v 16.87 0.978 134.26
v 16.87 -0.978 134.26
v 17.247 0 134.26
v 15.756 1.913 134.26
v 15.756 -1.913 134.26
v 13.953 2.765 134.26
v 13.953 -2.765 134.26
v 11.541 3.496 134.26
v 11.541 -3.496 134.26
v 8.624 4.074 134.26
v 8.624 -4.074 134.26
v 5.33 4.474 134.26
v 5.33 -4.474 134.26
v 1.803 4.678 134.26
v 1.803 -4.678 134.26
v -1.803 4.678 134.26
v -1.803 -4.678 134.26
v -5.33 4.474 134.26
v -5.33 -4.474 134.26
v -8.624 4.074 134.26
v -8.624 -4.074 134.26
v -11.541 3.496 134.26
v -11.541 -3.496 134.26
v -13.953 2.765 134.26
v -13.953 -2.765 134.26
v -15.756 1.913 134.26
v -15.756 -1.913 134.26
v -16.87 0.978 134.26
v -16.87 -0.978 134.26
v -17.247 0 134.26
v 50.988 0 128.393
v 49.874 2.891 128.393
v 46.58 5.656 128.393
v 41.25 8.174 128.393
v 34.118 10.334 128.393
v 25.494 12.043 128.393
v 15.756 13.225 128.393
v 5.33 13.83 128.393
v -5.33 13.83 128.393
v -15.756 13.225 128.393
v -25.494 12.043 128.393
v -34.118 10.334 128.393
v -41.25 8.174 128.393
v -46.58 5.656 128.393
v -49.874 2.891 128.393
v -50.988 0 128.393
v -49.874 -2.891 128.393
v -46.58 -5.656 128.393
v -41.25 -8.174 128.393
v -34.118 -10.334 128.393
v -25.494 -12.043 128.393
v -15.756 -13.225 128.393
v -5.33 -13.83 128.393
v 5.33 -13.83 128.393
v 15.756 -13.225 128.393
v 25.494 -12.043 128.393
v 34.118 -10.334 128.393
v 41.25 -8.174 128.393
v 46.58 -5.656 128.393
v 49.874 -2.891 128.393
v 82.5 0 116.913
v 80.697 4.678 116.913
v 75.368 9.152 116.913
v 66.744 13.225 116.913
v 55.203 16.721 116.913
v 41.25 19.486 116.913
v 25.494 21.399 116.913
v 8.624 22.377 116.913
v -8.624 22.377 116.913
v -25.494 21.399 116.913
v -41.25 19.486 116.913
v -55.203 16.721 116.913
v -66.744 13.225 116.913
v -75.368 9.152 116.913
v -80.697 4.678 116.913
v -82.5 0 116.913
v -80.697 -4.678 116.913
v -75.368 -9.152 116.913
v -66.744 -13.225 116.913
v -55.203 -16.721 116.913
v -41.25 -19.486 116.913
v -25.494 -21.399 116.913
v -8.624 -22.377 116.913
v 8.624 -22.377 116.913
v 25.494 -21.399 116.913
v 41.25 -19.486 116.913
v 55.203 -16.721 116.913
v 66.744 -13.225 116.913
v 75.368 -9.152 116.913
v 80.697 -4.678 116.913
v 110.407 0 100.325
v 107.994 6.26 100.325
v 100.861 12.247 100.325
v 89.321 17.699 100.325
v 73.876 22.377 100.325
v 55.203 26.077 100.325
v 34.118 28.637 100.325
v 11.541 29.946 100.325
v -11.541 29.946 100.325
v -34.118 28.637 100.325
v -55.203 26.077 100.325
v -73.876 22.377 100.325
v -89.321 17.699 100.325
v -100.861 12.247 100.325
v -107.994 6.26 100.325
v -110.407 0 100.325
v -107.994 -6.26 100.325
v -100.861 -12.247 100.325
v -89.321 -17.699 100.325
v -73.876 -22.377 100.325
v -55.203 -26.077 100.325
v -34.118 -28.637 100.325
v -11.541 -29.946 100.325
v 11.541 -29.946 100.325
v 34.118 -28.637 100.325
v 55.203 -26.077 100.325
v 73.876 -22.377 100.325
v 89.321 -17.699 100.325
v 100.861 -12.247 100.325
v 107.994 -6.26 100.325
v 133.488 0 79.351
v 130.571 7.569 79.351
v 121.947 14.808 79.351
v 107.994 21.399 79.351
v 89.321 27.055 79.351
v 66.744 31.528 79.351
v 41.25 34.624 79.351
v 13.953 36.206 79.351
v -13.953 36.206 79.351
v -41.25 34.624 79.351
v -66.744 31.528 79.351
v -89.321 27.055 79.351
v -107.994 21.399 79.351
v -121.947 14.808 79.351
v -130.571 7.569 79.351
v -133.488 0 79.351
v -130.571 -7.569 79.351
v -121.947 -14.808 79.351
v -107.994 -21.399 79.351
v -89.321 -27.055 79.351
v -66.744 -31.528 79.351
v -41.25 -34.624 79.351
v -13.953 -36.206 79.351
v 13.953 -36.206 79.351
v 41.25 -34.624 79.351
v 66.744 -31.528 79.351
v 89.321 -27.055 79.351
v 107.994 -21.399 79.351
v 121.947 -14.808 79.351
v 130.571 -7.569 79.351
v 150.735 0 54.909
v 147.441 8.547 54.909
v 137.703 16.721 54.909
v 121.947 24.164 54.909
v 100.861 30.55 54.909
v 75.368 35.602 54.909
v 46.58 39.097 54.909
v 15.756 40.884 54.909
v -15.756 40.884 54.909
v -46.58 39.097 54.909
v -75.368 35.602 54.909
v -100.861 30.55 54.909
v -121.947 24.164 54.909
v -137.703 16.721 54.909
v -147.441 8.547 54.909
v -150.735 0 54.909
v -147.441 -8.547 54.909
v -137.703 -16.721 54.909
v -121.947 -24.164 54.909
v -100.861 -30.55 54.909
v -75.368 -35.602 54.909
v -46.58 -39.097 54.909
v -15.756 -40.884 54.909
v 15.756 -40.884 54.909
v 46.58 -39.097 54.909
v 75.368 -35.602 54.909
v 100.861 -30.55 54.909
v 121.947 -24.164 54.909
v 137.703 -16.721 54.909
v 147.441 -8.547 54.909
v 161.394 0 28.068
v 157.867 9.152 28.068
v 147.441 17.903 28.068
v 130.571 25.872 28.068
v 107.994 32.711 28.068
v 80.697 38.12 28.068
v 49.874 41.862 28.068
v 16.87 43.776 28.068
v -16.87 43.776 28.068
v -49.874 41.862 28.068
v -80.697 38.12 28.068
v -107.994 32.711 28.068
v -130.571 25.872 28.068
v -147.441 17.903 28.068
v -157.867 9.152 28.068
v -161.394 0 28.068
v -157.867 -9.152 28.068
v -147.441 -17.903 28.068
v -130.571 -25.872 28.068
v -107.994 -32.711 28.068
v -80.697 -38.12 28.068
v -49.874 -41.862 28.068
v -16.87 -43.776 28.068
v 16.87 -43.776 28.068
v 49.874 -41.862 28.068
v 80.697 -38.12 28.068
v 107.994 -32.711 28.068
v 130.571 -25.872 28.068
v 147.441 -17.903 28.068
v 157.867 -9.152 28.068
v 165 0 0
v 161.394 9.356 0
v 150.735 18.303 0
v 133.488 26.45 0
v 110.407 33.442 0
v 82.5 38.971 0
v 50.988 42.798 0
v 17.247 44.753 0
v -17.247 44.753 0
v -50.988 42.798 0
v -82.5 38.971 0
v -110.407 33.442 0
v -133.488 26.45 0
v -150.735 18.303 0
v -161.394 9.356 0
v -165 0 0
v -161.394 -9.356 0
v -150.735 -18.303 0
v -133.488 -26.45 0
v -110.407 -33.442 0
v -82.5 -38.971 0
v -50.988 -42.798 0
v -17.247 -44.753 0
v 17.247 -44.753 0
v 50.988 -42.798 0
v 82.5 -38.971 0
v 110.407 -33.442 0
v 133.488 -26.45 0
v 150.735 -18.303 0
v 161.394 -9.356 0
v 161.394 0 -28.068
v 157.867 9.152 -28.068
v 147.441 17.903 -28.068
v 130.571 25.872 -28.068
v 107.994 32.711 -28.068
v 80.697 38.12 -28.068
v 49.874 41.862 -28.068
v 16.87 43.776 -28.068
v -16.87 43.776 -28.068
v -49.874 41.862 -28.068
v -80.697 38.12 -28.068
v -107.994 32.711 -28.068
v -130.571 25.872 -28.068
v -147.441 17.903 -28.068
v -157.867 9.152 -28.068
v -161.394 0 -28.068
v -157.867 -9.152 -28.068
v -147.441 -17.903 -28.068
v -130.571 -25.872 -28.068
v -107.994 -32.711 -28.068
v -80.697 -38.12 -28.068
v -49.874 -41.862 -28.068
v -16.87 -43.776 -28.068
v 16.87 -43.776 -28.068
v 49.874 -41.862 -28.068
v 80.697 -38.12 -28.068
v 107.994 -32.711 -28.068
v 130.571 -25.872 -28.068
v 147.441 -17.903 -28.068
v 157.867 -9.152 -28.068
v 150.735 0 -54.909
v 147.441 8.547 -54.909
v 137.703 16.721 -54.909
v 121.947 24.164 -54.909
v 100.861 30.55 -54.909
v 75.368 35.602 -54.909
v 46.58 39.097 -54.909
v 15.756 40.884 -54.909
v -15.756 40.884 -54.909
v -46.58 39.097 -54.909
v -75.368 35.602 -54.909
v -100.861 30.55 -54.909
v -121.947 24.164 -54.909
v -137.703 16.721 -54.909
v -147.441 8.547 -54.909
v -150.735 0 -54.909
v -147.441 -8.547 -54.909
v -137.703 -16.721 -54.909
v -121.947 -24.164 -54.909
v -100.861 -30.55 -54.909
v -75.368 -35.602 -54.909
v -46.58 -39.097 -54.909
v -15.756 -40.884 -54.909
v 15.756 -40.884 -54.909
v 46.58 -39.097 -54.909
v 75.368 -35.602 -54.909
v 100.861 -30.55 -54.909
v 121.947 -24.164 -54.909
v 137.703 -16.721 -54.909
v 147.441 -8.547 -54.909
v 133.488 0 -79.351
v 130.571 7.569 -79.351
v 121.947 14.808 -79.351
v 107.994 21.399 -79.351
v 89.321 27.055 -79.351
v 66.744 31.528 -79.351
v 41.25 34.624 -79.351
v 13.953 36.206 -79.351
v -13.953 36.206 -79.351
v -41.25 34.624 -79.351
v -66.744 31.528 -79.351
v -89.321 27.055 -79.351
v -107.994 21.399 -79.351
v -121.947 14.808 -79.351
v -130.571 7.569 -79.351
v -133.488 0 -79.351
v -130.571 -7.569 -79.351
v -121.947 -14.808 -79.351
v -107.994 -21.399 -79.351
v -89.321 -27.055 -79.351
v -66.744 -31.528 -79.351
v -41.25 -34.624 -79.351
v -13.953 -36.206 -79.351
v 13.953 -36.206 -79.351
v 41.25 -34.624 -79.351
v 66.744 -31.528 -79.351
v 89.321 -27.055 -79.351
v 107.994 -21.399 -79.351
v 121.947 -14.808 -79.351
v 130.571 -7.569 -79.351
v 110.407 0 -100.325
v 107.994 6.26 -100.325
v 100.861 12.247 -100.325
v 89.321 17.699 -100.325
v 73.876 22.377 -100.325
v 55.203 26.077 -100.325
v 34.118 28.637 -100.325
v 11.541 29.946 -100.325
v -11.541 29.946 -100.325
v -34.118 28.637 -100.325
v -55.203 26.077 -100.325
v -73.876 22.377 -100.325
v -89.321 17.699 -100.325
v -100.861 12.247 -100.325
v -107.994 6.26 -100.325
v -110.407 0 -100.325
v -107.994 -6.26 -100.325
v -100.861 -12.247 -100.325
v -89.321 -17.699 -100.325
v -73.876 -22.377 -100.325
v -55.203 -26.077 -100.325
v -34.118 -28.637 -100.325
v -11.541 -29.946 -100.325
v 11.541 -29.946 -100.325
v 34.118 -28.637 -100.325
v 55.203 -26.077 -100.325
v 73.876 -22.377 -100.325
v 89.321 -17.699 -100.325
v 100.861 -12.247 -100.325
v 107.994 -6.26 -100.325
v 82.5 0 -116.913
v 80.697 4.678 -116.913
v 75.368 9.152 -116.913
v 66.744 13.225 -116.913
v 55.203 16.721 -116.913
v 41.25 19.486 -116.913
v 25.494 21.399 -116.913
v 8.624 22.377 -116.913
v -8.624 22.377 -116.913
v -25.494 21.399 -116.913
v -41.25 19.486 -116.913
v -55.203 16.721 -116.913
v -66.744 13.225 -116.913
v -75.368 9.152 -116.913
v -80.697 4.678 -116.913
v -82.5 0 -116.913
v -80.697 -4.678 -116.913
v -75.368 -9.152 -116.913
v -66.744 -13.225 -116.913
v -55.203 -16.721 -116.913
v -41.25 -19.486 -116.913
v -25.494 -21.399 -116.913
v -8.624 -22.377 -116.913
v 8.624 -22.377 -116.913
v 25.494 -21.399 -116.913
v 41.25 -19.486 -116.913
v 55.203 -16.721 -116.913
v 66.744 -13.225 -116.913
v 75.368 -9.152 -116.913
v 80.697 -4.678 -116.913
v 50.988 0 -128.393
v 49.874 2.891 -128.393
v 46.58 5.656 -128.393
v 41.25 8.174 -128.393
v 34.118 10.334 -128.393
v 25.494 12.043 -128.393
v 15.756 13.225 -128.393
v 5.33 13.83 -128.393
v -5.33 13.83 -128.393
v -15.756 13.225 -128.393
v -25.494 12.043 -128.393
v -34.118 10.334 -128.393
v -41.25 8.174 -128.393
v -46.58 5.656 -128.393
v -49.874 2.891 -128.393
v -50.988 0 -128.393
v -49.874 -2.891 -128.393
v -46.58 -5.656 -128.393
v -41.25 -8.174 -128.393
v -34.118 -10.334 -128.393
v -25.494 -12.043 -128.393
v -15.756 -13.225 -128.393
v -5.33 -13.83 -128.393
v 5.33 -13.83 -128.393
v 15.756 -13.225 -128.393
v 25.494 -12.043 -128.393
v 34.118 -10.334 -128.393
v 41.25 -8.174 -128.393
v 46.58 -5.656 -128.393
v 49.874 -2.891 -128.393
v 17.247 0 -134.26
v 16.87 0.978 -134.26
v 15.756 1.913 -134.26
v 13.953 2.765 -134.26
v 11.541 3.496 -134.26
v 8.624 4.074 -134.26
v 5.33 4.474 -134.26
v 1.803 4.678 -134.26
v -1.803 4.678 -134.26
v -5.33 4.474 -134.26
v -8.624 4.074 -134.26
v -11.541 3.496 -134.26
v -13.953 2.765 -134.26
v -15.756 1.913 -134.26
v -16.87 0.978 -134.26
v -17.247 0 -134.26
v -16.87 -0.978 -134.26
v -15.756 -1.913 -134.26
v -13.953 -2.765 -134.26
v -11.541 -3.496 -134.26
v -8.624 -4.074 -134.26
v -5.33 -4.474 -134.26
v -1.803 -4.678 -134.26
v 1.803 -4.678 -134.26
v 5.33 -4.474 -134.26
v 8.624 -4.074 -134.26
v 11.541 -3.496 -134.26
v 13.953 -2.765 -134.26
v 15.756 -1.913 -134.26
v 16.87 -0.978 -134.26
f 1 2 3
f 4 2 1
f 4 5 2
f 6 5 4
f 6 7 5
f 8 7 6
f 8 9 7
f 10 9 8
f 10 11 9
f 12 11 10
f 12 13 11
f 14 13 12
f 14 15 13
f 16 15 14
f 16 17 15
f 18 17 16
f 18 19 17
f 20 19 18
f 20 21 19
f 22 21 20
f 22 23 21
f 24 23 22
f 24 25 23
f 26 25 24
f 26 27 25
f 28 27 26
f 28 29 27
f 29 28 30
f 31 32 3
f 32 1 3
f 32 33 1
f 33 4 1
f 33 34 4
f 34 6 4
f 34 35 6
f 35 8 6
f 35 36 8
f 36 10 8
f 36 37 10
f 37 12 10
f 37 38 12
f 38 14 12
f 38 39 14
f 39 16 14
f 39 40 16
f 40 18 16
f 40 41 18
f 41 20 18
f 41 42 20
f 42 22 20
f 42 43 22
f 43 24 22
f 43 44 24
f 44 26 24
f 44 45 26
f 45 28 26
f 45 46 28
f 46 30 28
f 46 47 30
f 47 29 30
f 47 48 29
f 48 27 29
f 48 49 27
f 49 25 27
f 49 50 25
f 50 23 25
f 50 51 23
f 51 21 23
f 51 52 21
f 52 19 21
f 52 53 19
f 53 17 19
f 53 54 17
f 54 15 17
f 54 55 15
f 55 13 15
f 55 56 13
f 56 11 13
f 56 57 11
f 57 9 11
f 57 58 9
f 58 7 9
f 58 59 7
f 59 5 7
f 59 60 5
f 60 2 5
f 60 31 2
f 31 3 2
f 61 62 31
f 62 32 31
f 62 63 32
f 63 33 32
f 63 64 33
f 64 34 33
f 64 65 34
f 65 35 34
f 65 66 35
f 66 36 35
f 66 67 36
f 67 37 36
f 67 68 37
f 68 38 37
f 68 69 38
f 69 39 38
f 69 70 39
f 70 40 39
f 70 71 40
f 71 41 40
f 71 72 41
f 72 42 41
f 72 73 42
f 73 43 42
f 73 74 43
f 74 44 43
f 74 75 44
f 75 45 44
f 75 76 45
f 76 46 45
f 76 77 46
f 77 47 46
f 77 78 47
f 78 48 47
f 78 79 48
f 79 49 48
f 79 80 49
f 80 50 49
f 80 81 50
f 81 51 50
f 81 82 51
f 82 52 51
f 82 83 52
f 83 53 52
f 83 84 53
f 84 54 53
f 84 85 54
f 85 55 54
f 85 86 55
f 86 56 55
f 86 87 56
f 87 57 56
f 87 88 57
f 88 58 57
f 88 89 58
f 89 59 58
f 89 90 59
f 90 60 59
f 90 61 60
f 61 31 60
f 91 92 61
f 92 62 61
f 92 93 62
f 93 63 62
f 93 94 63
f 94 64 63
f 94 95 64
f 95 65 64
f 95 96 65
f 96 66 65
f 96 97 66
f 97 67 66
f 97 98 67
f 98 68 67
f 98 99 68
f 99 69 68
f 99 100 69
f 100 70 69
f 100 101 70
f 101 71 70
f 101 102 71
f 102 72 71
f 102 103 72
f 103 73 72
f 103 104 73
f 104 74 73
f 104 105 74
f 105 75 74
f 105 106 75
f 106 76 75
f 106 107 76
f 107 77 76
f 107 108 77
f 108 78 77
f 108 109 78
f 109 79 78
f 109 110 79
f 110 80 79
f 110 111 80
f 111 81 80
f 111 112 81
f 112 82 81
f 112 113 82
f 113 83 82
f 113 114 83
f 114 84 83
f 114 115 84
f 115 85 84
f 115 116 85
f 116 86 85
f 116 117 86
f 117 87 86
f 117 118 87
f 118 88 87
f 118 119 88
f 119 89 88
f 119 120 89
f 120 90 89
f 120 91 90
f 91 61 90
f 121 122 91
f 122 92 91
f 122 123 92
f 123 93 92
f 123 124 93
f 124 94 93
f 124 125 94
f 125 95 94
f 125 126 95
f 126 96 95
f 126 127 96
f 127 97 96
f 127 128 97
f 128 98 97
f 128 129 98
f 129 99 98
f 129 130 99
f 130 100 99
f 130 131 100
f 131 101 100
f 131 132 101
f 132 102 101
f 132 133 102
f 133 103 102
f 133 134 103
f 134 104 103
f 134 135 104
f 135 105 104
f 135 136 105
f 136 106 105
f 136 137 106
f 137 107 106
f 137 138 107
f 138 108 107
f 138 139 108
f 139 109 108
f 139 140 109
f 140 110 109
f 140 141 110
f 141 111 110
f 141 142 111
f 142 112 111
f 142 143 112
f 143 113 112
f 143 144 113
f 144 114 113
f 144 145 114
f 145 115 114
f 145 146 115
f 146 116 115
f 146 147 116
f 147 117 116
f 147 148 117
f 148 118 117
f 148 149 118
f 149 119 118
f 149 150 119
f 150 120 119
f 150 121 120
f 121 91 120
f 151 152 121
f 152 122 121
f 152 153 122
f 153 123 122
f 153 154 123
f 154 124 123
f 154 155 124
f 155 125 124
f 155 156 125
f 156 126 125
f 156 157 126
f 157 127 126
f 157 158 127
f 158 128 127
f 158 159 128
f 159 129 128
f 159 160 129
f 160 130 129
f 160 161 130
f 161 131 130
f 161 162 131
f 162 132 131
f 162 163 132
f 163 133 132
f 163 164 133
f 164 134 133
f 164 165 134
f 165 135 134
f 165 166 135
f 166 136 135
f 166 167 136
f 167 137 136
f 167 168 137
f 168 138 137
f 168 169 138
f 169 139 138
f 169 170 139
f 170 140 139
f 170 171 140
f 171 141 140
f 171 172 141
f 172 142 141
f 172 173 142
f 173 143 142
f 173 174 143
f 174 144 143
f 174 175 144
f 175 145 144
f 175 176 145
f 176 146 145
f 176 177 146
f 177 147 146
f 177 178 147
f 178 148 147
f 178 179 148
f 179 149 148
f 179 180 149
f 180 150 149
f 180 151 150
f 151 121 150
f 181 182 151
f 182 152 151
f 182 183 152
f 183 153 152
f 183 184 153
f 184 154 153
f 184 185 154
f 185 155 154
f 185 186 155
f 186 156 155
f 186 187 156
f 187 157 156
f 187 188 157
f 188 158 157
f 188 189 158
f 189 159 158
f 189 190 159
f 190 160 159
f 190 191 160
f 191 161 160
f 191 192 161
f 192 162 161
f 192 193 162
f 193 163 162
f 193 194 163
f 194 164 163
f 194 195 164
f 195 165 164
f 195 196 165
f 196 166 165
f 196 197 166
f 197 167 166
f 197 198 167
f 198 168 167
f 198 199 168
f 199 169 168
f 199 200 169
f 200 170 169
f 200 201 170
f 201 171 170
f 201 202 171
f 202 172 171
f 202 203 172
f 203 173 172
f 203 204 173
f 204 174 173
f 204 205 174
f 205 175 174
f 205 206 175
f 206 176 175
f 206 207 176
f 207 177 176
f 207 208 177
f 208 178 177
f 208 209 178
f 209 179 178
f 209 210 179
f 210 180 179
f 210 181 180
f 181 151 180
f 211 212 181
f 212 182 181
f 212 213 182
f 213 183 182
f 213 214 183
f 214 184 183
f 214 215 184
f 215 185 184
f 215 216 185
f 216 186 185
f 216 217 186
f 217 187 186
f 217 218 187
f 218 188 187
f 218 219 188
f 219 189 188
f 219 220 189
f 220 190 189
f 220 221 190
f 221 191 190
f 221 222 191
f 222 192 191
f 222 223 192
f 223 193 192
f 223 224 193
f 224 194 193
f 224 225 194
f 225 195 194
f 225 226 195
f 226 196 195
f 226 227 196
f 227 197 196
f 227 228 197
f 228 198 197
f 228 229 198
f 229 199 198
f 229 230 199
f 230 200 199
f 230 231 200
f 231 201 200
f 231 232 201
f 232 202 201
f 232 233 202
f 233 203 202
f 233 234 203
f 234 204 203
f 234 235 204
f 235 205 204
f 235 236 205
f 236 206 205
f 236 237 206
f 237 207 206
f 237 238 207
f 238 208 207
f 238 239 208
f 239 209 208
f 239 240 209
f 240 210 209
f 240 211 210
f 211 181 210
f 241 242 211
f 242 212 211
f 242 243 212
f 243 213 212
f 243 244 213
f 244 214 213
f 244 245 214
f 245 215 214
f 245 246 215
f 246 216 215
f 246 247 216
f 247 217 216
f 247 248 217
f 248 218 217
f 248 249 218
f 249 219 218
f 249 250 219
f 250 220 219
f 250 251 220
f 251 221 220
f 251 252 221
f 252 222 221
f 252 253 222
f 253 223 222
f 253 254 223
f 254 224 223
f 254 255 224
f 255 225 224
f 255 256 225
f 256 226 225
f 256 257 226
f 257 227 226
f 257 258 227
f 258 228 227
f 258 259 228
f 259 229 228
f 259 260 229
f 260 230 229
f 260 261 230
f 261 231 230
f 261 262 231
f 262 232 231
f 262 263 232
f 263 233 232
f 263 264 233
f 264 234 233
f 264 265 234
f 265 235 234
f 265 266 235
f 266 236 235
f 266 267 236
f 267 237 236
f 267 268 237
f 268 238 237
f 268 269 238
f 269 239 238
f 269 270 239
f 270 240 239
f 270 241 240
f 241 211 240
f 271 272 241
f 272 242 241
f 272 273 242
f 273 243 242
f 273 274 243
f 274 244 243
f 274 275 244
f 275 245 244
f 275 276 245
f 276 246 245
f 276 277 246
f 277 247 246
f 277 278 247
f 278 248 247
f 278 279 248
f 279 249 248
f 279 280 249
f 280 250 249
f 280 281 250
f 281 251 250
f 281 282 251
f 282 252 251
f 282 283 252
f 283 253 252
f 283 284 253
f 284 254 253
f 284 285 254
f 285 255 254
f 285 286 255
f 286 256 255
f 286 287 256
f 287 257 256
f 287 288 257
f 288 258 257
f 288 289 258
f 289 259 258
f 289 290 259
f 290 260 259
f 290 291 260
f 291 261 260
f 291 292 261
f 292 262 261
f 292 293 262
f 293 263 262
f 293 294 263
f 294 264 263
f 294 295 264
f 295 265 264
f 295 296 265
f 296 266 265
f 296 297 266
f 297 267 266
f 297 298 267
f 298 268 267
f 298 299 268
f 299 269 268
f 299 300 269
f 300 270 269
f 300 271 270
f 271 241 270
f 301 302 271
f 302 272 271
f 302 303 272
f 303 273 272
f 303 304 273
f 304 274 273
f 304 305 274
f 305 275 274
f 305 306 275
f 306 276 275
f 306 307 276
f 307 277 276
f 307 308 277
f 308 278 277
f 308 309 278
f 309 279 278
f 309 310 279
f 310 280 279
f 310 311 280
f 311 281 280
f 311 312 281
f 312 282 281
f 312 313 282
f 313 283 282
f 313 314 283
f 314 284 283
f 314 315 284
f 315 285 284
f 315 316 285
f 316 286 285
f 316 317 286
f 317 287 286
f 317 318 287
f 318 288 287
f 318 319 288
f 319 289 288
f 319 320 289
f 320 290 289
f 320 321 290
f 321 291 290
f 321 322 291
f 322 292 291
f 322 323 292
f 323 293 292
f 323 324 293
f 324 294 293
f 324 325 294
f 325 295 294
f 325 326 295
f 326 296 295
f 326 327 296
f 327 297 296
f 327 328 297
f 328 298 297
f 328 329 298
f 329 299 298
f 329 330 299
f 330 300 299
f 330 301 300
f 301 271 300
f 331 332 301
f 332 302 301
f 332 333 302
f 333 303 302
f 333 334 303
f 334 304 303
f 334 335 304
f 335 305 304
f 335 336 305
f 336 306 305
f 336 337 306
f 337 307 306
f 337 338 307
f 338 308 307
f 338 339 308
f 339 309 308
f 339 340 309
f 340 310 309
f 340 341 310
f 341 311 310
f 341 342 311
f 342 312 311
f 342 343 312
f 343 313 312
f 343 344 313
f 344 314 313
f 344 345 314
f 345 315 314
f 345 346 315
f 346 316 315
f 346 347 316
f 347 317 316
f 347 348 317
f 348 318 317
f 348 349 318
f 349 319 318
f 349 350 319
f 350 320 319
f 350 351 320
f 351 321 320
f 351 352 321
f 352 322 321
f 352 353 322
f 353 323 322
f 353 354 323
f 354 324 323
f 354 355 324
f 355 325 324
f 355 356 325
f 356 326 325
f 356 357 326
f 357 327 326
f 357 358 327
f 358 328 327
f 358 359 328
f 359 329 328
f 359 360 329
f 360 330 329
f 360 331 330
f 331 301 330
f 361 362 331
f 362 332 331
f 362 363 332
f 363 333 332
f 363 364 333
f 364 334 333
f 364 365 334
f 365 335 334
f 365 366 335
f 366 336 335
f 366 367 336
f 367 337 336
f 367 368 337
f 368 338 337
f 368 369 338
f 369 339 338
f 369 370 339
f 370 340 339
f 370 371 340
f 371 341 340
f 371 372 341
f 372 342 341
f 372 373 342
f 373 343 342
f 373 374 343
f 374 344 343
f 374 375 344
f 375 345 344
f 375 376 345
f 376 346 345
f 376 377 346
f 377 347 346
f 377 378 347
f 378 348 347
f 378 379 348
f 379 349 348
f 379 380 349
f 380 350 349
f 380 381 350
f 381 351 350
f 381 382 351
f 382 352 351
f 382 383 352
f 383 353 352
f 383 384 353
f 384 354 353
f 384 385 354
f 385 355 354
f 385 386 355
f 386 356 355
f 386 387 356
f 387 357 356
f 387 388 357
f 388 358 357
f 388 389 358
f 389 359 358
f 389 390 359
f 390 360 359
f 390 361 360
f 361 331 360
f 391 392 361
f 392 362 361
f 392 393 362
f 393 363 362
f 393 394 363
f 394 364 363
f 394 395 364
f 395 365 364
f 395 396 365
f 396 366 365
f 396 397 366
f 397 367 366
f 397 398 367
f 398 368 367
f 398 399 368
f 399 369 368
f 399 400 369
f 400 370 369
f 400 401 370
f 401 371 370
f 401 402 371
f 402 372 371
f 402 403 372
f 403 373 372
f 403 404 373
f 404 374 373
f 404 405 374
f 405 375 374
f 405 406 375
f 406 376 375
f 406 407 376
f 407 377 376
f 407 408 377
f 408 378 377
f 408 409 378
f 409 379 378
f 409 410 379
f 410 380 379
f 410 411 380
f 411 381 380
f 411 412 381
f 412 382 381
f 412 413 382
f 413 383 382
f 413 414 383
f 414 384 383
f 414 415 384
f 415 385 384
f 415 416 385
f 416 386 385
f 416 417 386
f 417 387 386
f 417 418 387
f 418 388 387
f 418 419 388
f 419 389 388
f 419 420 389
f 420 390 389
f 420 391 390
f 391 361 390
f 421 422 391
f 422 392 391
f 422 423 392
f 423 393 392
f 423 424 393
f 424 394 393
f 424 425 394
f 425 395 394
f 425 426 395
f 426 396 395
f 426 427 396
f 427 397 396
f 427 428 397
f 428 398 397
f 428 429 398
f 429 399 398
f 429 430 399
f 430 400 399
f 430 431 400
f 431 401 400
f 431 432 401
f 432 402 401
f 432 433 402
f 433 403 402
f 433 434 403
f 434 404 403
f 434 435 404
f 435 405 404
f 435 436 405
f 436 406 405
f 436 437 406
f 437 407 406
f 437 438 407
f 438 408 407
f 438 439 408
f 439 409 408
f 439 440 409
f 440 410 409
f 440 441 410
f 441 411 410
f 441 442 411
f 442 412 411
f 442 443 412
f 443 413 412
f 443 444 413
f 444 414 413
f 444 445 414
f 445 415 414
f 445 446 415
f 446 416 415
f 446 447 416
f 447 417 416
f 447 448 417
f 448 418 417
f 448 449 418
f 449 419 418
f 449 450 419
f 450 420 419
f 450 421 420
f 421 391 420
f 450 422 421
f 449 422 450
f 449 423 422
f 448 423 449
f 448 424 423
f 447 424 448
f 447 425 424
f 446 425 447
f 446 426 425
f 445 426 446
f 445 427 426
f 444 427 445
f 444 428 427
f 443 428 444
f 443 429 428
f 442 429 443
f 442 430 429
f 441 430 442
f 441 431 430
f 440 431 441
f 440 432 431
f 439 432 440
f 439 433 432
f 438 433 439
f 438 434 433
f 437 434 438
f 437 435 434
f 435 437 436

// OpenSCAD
// Generated by SolidPython 1.0.1 on 2020-07-29 00:46:49


scale(v = [11, 3, 9]) {
	sphere(r = 15);
}
/***********************************************
*********      SolidPython code:      **********
************************************************
 
# import packages: SolidPython
from solid import *
from solid.utils import *
from itertools import chain, combinations, permutations


class Resize:

    def __init__(self, scad_file):
        self.scad_file = scad_file
        #self.scad_file = import_scad(scad_file)
        # cone/cylinder param:
        self.r1 = 0
        self.r2 = 0
        self.h = 0
        # rectangular prism param:
        self.w = 0
        self.l = 0
        # ellipse param:
        self.r = 0

    # import OpenScad code (file name corresponds to shape)


    # classify shape + parameters
    def assign(self, param1, param2, param3):
        if self.scad_file == 'cone.scad':
            self.r1 = param1
            self.r2 = param2
            self.h = param3
        elif self.scad_file == 'cylinder.scad':
            self.r1 = param1
            self.r2 = param2
            self.h = param3
        elif self.scad_file == 'rectangularPrism.scad':
            self.h = param1
            self.l = param2
            self.w = param3
        else:
            self.r = param1
            self.h = param2

    # resize parameters
    def iterate(self):
        x = range(3, 20, 2)
        i = 1
        if self.scad_file == 'cone.scad':
            tempList = list(permutations(x, 2))
            for temp in tempList:
                param1 = temp[0]
                param2 = temp[1]
                filepath = 'produced_scad_files/' + 'cone' + str(param1) + '_' + str(param2) + '_' + '.scad'
                scad_render_to_file(cylinder(h=param1, r1=param2, r2=0), filepath)

        elif self.scad_file == 'cylinder.scad':
            tempList = list(permutations(x, 3))
            for temp in tempList:
                param1 = temp[0]
                param2 = temp[1]
                filepath = 'produced_scad_files/' + 'cylinder' + str(param1) + '_' + str(param2) + '_' + '.scad'
                scad_render_to_file(cylinder(h=param1, r1=param2, r2=param2), filepath)

        elif self.scad_file == 'rectangularPrism.scad':
            tempList = list(permutations(x, 3))
            for temp in tempList:
                param1 = temp[0]
                param2 = temp[1]
                param3 = temp[2]
                filepath = 'produced_scad_files/' + 'rectangularPrism' + str(param1) + '_' + str(param2) + '_' + str(
                    param3) + '.scad'
                scad_render_to_file(cube(size=(param1, param2, param3)), filepath)

        elif self.scad_file == 'ellipse.scad':
            tempList = list(permutations(x, 4))
            for temp in tempList:
                param1 = temp[0]
                param2 = temp[1]
                param3 = temp[2]
                param4 = temp[3]
                filepath = 'produced_scad_files/' + 'ellipse' + str(param1) + '_' + str(param2) + '_' + str(param3) + '_' + str(param4) + '.scad'
                scad_render_to_file(scale([param1, param2, param3])(sphere(r=param4)), filepath)

    def render_to_scadfile(self):
        scad_render_to_file(scad, 'example.scad') 
 
************************************************/
